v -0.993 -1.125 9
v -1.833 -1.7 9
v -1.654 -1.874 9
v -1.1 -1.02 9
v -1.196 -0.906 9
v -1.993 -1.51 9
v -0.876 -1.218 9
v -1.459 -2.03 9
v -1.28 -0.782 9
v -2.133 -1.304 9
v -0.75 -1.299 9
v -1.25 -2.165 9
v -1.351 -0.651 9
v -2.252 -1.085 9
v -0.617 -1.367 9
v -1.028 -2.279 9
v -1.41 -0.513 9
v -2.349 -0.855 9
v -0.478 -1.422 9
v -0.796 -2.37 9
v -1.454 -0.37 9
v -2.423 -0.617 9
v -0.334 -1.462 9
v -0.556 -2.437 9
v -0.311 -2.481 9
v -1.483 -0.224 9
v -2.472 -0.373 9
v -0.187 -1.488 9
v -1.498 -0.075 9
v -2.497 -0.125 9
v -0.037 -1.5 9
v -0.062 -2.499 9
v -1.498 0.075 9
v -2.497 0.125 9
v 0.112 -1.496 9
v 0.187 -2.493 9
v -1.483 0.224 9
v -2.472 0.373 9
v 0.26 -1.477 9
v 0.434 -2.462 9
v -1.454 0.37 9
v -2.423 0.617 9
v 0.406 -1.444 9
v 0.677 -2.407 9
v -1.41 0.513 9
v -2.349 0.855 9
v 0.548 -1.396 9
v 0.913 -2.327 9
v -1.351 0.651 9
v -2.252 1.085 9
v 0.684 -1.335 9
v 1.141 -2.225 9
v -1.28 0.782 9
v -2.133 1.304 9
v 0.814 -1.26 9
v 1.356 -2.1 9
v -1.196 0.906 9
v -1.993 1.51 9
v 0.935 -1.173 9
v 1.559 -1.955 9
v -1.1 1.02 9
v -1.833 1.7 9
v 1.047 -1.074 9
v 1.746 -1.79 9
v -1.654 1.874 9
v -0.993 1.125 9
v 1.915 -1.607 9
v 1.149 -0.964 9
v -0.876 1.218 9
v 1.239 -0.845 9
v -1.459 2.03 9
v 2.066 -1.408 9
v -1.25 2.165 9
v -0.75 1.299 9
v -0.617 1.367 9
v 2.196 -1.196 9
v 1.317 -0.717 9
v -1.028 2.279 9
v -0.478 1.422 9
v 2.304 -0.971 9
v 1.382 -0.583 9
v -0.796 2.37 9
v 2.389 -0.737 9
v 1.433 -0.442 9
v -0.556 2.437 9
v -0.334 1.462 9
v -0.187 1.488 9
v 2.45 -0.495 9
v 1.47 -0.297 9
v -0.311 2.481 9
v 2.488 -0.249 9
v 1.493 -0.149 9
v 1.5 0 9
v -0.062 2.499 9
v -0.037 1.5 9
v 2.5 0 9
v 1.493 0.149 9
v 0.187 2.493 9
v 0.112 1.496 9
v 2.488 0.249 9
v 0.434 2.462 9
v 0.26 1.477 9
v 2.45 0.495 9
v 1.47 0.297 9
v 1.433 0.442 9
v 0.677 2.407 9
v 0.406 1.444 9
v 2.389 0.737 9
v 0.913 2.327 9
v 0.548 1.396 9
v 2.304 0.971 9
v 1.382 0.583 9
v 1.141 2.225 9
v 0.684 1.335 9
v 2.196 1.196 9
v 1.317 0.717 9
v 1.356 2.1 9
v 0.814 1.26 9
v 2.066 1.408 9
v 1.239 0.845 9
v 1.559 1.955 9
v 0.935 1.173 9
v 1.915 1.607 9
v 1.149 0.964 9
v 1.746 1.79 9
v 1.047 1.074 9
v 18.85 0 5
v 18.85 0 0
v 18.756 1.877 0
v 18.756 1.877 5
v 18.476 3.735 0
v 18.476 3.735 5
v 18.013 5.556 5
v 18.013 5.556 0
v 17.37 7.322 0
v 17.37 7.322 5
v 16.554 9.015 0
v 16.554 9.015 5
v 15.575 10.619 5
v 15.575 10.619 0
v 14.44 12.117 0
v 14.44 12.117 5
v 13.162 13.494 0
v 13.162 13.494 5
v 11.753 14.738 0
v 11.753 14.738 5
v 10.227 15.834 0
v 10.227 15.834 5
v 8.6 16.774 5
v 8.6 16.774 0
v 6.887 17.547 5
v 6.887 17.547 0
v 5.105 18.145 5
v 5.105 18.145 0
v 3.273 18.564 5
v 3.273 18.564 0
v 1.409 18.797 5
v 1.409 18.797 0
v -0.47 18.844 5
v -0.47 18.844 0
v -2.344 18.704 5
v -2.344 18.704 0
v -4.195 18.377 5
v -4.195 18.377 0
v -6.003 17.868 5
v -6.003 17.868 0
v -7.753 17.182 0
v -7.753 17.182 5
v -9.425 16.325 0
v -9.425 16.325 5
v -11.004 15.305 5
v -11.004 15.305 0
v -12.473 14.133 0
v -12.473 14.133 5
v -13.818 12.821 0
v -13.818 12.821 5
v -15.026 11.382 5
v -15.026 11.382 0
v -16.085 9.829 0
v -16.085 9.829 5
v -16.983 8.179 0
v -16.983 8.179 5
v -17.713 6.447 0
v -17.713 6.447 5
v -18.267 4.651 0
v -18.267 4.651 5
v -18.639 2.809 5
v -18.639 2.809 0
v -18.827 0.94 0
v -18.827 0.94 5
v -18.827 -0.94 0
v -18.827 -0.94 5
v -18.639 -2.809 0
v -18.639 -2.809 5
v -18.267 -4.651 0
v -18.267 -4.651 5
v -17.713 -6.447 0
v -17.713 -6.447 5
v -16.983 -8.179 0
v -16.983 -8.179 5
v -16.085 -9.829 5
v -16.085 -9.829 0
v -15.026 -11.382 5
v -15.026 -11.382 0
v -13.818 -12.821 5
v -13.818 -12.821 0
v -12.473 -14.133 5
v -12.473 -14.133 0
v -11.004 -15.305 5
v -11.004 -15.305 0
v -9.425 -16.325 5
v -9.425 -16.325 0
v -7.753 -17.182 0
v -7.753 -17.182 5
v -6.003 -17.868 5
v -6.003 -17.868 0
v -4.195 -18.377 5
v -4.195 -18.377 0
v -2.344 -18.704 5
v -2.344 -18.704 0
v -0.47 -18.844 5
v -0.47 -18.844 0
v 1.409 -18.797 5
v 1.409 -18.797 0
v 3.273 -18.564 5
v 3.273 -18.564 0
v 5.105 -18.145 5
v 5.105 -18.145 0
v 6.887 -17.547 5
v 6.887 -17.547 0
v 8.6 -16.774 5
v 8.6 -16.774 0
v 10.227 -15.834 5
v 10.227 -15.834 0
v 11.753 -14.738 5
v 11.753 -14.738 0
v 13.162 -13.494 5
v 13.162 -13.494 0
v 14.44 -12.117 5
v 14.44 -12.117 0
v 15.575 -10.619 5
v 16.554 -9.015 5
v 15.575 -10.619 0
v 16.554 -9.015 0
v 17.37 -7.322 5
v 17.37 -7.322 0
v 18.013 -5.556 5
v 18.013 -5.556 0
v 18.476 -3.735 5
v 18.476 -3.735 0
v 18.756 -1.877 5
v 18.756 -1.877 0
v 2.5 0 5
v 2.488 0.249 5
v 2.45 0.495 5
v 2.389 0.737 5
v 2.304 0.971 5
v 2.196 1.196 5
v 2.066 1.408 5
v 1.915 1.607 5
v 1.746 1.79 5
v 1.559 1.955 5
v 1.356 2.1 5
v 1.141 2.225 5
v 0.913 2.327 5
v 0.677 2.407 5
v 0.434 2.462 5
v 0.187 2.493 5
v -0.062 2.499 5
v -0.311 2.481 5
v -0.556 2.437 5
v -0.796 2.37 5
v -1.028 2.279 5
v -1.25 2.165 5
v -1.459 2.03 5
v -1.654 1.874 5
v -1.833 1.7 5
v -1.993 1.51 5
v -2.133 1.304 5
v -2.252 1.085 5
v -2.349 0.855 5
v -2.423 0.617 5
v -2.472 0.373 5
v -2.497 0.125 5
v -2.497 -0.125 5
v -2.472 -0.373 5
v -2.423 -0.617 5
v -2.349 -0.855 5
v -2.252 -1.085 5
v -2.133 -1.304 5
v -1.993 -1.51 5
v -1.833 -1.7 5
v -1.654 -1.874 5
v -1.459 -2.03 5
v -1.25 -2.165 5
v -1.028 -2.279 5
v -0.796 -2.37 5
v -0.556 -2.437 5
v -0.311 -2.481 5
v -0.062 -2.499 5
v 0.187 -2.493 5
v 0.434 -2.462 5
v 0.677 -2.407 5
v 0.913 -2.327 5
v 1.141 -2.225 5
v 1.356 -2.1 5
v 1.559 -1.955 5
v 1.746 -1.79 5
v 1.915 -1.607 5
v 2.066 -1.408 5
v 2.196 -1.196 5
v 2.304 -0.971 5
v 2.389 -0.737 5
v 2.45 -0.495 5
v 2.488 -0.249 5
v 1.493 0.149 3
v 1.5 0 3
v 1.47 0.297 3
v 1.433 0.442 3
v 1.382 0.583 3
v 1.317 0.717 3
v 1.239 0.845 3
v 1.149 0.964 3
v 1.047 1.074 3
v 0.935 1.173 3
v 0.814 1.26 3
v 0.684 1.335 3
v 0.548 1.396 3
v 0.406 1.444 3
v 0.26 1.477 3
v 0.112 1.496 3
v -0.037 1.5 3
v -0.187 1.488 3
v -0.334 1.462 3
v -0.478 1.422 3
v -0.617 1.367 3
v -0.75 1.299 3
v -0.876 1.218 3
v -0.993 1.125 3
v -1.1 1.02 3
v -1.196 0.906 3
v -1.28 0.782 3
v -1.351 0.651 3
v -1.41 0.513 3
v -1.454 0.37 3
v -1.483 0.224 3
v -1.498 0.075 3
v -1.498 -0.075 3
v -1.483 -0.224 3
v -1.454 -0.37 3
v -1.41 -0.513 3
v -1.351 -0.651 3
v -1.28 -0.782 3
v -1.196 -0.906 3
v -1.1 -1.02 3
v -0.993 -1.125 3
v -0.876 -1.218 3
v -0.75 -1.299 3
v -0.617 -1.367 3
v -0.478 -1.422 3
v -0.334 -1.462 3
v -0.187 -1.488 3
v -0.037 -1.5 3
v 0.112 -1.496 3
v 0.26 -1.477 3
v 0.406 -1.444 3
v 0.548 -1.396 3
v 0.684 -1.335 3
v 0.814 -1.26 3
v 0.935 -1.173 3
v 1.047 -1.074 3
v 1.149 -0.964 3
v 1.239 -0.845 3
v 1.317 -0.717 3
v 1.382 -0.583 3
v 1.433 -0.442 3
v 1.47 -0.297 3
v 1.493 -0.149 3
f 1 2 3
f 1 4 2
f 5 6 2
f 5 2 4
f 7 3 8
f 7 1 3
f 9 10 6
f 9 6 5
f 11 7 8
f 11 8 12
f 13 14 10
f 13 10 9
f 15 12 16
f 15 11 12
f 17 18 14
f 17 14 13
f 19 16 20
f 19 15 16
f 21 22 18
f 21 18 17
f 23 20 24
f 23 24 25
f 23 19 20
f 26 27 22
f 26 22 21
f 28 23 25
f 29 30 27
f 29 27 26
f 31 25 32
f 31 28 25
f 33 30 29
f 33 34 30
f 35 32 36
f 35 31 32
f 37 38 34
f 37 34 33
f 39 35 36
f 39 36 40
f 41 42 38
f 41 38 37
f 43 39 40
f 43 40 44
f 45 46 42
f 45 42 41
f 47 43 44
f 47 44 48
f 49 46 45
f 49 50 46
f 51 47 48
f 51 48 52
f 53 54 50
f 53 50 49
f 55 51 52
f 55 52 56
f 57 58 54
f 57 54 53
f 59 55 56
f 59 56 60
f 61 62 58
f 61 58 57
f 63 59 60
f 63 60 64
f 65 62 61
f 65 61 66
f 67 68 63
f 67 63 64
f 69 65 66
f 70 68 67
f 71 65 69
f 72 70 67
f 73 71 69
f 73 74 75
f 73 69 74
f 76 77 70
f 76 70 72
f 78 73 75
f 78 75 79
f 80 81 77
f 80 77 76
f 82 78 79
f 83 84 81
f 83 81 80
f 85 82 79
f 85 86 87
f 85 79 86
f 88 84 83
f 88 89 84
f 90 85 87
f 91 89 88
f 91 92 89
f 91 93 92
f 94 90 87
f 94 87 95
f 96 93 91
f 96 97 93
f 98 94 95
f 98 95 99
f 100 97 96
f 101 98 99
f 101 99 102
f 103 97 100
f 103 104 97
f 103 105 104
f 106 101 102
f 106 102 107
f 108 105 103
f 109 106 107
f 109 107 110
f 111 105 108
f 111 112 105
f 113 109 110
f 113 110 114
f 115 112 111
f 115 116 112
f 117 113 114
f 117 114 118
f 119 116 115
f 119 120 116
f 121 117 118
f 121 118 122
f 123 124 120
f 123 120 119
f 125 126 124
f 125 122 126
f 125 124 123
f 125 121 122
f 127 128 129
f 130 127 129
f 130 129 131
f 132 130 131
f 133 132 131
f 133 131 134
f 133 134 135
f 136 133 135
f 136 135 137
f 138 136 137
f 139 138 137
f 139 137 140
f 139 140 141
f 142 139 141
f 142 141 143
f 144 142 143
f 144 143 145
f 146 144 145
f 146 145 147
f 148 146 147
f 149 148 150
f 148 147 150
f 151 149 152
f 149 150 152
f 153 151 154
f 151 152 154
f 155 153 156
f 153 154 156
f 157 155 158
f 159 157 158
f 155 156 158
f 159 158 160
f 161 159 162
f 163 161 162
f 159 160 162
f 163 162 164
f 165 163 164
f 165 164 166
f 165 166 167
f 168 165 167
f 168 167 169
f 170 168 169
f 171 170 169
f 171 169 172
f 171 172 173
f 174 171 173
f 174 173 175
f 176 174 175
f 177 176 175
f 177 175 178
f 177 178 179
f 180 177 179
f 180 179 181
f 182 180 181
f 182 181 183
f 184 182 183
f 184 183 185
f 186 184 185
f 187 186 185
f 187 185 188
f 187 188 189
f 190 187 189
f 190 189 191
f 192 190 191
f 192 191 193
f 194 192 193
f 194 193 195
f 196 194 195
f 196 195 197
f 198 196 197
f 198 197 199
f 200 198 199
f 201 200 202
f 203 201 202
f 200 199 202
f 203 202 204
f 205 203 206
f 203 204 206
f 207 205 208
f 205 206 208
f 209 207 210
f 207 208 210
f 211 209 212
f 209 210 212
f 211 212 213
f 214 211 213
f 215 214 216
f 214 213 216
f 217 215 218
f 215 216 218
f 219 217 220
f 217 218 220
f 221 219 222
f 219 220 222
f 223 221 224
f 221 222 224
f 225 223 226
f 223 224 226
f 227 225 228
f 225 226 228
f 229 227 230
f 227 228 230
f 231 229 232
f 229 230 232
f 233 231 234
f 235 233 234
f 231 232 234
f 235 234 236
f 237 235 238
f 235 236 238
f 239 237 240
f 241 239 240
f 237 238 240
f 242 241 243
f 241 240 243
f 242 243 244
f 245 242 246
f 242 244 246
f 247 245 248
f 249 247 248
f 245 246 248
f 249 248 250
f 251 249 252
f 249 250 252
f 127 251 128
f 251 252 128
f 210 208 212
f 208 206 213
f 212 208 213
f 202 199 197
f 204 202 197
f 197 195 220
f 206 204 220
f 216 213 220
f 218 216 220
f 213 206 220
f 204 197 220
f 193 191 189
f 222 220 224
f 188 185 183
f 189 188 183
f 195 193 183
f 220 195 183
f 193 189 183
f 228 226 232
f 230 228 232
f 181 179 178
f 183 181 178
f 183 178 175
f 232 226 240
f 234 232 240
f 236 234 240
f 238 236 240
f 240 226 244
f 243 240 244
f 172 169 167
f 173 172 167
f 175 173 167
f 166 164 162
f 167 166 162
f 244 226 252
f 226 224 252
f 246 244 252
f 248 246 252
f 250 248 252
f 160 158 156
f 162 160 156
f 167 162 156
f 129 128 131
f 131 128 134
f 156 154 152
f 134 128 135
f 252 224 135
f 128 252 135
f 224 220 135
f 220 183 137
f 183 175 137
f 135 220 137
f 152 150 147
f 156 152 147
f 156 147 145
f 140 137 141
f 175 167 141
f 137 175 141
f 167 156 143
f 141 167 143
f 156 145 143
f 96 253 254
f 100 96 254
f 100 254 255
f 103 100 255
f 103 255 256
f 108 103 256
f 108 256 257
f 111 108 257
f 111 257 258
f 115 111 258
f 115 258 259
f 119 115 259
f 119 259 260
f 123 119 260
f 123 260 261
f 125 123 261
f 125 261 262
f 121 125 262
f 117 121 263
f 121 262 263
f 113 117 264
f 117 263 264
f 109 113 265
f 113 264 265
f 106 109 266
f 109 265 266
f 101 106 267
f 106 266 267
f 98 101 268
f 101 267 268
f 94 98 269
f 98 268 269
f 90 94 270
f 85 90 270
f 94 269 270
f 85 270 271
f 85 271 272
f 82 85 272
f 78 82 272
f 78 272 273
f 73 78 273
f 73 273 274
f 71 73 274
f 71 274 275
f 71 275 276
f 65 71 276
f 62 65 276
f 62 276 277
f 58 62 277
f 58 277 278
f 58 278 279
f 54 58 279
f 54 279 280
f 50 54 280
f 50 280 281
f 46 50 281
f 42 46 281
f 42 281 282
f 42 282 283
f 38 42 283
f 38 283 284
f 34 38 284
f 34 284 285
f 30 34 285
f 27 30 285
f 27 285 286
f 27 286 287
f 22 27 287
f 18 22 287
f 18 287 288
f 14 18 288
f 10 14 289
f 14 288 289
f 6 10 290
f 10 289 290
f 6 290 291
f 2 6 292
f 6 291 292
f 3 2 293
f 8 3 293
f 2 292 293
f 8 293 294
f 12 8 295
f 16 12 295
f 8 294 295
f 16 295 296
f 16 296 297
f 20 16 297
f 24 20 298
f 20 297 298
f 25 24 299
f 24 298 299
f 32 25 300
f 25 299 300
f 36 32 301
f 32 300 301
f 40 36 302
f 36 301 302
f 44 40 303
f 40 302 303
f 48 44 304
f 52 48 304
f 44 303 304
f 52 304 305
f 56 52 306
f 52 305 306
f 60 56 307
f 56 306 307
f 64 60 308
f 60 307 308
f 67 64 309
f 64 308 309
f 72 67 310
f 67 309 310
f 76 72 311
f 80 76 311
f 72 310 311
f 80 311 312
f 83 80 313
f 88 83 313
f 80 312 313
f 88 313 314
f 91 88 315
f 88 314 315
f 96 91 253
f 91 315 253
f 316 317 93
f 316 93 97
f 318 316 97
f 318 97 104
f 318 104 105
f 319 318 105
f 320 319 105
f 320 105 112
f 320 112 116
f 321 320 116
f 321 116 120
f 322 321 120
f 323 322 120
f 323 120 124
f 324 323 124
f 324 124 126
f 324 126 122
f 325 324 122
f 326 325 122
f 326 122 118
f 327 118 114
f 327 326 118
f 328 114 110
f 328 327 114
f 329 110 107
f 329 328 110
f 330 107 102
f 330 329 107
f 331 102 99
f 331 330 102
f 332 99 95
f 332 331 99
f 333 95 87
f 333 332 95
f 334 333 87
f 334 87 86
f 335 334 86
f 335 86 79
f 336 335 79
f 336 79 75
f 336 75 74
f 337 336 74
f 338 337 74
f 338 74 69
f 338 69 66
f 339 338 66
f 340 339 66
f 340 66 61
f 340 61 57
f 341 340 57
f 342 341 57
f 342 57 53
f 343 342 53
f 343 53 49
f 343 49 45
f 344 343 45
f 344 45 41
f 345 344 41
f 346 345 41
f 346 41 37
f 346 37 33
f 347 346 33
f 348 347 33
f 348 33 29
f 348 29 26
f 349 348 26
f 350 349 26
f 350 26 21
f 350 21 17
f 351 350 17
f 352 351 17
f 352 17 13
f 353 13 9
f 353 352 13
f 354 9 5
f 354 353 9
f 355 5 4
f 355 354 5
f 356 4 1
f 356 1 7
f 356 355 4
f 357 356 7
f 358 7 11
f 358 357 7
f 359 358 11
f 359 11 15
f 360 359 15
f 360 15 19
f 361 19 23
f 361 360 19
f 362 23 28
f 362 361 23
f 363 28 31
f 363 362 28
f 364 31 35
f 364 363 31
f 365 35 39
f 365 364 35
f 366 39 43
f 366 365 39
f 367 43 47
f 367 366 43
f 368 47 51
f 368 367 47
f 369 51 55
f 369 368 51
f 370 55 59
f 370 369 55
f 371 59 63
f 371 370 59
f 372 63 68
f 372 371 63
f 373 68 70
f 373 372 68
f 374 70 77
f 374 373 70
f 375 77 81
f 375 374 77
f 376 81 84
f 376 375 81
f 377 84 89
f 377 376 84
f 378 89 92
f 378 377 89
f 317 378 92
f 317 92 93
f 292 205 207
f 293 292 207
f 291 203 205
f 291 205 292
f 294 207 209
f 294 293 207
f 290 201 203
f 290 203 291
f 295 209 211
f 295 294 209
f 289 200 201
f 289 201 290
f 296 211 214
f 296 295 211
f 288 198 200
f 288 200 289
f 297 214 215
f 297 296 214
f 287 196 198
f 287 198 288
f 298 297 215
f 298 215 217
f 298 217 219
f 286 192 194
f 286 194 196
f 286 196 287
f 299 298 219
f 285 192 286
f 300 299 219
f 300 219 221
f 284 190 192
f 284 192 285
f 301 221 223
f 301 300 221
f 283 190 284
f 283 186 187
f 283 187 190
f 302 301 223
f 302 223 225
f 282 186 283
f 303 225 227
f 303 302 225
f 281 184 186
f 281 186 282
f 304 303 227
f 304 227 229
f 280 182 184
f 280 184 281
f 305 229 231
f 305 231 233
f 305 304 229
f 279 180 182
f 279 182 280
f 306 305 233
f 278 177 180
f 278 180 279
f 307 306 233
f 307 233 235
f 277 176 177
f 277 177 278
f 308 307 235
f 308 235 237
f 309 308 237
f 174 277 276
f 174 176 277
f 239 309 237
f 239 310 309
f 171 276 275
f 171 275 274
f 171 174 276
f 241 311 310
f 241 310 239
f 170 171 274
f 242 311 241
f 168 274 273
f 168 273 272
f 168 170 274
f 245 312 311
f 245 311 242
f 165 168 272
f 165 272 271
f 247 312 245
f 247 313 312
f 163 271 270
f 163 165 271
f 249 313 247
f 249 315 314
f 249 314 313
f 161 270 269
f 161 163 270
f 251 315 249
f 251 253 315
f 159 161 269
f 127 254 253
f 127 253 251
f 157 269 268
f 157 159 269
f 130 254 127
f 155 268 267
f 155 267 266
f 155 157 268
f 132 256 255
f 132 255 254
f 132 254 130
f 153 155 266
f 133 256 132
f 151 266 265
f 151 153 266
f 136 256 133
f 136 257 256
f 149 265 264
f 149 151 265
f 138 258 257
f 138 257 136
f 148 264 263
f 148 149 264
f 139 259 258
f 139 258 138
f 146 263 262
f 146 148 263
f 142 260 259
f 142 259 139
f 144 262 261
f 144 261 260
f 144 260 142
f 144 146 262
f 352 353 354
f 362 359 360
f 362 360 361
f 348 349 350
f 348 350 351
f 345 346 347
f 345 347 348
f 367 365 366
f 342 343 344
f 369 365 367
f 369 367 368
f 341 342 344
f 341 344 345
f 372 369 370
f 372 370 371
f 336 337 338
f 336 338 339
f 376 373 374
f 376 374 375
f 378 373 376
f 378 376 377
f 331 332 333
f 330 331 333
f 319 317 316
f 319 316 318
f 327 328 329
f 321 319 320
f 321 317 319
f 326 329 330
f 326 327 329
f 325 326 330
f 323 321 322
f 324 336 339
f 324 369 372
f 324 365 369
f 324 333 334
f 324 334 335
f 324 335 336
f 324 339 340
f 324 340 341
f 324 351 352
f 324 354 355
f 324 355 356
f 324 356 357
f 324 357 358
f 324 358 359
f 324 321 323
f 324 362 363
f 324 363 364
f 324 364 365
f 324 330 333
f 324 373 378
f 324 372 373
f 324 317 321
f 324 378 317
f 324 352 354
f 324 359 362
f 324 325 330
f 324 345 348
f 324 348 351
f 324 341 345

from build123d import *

# Parameters (mm, degrees)
F0_R     = 18.85
F0_R_2   = 2.5
F0_R_3   = 1.5
F1_DEPTH = 5
F2_DEPTH = 9
F3_DEPTH = 3


with BuildPart() as f1:
    # F0 (on Top) → F1 (new body)
    with BuildSketch(Plane.XY):
        Circle(F0_R)
        Circle(F0_R_2, mode=Mode.SUBTRACT)
        Circle(F0_R_2)
        Circle(F0_R_3, mode=Mode.SUBTRACT)
    extrude(amount=F1_DEPTH)

    # F0 (on Top) → F2 (join)
    with BuildSketch(Plane.XY):
        Circle(F0_R_2)
        Circle(F0_R_3, mode=Mode.SUBTRACT)
    extrude(amount=F2_DEPTH)

    # F0 (on Top) → F3 (join)
    with BuildSketch(Plane.XY):
        Circle(F0_R)
        Circle(F0_R_2, mode=Mode.SUBTRACT)
        Circle(F0_R_3)
    extrude(amount=F3_DEPTH)


solid = f1.part
